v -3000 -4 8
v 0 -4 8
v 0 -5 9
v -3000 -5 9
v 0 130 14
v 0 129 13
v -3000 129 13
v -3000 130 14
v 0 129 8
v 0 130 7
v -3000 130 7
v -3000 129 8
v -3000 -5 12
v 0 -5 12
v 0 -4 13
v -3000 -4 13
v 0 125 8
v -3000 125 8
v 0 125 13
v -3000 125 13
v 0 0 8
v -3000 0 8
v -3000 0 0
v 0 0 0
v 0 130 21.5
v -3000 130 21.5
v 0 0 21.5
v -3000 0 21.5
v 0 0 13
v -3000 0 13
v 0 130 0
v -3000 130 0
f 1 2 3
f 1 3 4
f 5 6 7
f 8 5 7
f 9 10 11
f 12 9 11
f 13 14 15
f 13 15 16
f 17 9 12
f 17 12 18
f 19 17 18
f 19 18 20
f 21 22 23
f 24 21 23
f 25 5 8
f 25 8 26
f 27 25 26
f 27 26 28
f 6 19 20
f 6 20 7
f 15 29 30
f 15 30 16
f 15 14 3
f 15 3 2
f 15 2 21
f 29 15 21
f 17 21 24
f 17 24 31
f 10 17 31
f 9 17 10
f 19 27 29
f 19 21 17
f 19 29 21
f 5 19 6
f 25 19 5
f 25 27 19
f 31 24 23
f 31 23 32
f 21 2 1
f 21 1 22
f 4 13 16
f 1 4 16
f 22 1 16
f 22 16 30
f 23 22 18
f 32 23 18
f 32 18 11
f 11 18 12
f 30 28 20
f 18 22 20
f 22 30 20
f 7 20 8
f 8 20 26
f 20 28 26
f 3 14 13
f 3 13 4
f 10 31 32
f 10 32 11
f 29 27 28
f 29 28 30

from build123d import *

# Parameters (mm, degrees)
F1_DEPTH = 3000
F2_SIZE  = 1
F3_SIZE  = 1


with BuildPart() as f1:
    # F0 (on Right) → F1 (new body)
    with BuildSketch(Plane.YZ):
        Polygon((0, 8), (0, 0), (130, 0), (130, 8), (125, 8), (125, 13), (130, 13), (130, 21.5), (0, 21.5), (0, 13), (-5, 13), (-5, 8), align=None)
    extrude(amount=-F1_DEPTH)

    # F2
    f2_edges = [f1.edges().sort_by_distance(p)[0] for p in [
        (-1500, -5, 13),
        (-1500, -5, 8),
    ]]
    chamfer(f2_edges, length=F2_SIZE)

    # F3
    f3_edges = [f1.edges().sort_by_distance(p)[0] for p in [
        (-1500, 130, 8),
        (-1500, 130, 13),
    ]]
    chamfer(f3_edges, length=F3_SIZE)


solid = f1.part
